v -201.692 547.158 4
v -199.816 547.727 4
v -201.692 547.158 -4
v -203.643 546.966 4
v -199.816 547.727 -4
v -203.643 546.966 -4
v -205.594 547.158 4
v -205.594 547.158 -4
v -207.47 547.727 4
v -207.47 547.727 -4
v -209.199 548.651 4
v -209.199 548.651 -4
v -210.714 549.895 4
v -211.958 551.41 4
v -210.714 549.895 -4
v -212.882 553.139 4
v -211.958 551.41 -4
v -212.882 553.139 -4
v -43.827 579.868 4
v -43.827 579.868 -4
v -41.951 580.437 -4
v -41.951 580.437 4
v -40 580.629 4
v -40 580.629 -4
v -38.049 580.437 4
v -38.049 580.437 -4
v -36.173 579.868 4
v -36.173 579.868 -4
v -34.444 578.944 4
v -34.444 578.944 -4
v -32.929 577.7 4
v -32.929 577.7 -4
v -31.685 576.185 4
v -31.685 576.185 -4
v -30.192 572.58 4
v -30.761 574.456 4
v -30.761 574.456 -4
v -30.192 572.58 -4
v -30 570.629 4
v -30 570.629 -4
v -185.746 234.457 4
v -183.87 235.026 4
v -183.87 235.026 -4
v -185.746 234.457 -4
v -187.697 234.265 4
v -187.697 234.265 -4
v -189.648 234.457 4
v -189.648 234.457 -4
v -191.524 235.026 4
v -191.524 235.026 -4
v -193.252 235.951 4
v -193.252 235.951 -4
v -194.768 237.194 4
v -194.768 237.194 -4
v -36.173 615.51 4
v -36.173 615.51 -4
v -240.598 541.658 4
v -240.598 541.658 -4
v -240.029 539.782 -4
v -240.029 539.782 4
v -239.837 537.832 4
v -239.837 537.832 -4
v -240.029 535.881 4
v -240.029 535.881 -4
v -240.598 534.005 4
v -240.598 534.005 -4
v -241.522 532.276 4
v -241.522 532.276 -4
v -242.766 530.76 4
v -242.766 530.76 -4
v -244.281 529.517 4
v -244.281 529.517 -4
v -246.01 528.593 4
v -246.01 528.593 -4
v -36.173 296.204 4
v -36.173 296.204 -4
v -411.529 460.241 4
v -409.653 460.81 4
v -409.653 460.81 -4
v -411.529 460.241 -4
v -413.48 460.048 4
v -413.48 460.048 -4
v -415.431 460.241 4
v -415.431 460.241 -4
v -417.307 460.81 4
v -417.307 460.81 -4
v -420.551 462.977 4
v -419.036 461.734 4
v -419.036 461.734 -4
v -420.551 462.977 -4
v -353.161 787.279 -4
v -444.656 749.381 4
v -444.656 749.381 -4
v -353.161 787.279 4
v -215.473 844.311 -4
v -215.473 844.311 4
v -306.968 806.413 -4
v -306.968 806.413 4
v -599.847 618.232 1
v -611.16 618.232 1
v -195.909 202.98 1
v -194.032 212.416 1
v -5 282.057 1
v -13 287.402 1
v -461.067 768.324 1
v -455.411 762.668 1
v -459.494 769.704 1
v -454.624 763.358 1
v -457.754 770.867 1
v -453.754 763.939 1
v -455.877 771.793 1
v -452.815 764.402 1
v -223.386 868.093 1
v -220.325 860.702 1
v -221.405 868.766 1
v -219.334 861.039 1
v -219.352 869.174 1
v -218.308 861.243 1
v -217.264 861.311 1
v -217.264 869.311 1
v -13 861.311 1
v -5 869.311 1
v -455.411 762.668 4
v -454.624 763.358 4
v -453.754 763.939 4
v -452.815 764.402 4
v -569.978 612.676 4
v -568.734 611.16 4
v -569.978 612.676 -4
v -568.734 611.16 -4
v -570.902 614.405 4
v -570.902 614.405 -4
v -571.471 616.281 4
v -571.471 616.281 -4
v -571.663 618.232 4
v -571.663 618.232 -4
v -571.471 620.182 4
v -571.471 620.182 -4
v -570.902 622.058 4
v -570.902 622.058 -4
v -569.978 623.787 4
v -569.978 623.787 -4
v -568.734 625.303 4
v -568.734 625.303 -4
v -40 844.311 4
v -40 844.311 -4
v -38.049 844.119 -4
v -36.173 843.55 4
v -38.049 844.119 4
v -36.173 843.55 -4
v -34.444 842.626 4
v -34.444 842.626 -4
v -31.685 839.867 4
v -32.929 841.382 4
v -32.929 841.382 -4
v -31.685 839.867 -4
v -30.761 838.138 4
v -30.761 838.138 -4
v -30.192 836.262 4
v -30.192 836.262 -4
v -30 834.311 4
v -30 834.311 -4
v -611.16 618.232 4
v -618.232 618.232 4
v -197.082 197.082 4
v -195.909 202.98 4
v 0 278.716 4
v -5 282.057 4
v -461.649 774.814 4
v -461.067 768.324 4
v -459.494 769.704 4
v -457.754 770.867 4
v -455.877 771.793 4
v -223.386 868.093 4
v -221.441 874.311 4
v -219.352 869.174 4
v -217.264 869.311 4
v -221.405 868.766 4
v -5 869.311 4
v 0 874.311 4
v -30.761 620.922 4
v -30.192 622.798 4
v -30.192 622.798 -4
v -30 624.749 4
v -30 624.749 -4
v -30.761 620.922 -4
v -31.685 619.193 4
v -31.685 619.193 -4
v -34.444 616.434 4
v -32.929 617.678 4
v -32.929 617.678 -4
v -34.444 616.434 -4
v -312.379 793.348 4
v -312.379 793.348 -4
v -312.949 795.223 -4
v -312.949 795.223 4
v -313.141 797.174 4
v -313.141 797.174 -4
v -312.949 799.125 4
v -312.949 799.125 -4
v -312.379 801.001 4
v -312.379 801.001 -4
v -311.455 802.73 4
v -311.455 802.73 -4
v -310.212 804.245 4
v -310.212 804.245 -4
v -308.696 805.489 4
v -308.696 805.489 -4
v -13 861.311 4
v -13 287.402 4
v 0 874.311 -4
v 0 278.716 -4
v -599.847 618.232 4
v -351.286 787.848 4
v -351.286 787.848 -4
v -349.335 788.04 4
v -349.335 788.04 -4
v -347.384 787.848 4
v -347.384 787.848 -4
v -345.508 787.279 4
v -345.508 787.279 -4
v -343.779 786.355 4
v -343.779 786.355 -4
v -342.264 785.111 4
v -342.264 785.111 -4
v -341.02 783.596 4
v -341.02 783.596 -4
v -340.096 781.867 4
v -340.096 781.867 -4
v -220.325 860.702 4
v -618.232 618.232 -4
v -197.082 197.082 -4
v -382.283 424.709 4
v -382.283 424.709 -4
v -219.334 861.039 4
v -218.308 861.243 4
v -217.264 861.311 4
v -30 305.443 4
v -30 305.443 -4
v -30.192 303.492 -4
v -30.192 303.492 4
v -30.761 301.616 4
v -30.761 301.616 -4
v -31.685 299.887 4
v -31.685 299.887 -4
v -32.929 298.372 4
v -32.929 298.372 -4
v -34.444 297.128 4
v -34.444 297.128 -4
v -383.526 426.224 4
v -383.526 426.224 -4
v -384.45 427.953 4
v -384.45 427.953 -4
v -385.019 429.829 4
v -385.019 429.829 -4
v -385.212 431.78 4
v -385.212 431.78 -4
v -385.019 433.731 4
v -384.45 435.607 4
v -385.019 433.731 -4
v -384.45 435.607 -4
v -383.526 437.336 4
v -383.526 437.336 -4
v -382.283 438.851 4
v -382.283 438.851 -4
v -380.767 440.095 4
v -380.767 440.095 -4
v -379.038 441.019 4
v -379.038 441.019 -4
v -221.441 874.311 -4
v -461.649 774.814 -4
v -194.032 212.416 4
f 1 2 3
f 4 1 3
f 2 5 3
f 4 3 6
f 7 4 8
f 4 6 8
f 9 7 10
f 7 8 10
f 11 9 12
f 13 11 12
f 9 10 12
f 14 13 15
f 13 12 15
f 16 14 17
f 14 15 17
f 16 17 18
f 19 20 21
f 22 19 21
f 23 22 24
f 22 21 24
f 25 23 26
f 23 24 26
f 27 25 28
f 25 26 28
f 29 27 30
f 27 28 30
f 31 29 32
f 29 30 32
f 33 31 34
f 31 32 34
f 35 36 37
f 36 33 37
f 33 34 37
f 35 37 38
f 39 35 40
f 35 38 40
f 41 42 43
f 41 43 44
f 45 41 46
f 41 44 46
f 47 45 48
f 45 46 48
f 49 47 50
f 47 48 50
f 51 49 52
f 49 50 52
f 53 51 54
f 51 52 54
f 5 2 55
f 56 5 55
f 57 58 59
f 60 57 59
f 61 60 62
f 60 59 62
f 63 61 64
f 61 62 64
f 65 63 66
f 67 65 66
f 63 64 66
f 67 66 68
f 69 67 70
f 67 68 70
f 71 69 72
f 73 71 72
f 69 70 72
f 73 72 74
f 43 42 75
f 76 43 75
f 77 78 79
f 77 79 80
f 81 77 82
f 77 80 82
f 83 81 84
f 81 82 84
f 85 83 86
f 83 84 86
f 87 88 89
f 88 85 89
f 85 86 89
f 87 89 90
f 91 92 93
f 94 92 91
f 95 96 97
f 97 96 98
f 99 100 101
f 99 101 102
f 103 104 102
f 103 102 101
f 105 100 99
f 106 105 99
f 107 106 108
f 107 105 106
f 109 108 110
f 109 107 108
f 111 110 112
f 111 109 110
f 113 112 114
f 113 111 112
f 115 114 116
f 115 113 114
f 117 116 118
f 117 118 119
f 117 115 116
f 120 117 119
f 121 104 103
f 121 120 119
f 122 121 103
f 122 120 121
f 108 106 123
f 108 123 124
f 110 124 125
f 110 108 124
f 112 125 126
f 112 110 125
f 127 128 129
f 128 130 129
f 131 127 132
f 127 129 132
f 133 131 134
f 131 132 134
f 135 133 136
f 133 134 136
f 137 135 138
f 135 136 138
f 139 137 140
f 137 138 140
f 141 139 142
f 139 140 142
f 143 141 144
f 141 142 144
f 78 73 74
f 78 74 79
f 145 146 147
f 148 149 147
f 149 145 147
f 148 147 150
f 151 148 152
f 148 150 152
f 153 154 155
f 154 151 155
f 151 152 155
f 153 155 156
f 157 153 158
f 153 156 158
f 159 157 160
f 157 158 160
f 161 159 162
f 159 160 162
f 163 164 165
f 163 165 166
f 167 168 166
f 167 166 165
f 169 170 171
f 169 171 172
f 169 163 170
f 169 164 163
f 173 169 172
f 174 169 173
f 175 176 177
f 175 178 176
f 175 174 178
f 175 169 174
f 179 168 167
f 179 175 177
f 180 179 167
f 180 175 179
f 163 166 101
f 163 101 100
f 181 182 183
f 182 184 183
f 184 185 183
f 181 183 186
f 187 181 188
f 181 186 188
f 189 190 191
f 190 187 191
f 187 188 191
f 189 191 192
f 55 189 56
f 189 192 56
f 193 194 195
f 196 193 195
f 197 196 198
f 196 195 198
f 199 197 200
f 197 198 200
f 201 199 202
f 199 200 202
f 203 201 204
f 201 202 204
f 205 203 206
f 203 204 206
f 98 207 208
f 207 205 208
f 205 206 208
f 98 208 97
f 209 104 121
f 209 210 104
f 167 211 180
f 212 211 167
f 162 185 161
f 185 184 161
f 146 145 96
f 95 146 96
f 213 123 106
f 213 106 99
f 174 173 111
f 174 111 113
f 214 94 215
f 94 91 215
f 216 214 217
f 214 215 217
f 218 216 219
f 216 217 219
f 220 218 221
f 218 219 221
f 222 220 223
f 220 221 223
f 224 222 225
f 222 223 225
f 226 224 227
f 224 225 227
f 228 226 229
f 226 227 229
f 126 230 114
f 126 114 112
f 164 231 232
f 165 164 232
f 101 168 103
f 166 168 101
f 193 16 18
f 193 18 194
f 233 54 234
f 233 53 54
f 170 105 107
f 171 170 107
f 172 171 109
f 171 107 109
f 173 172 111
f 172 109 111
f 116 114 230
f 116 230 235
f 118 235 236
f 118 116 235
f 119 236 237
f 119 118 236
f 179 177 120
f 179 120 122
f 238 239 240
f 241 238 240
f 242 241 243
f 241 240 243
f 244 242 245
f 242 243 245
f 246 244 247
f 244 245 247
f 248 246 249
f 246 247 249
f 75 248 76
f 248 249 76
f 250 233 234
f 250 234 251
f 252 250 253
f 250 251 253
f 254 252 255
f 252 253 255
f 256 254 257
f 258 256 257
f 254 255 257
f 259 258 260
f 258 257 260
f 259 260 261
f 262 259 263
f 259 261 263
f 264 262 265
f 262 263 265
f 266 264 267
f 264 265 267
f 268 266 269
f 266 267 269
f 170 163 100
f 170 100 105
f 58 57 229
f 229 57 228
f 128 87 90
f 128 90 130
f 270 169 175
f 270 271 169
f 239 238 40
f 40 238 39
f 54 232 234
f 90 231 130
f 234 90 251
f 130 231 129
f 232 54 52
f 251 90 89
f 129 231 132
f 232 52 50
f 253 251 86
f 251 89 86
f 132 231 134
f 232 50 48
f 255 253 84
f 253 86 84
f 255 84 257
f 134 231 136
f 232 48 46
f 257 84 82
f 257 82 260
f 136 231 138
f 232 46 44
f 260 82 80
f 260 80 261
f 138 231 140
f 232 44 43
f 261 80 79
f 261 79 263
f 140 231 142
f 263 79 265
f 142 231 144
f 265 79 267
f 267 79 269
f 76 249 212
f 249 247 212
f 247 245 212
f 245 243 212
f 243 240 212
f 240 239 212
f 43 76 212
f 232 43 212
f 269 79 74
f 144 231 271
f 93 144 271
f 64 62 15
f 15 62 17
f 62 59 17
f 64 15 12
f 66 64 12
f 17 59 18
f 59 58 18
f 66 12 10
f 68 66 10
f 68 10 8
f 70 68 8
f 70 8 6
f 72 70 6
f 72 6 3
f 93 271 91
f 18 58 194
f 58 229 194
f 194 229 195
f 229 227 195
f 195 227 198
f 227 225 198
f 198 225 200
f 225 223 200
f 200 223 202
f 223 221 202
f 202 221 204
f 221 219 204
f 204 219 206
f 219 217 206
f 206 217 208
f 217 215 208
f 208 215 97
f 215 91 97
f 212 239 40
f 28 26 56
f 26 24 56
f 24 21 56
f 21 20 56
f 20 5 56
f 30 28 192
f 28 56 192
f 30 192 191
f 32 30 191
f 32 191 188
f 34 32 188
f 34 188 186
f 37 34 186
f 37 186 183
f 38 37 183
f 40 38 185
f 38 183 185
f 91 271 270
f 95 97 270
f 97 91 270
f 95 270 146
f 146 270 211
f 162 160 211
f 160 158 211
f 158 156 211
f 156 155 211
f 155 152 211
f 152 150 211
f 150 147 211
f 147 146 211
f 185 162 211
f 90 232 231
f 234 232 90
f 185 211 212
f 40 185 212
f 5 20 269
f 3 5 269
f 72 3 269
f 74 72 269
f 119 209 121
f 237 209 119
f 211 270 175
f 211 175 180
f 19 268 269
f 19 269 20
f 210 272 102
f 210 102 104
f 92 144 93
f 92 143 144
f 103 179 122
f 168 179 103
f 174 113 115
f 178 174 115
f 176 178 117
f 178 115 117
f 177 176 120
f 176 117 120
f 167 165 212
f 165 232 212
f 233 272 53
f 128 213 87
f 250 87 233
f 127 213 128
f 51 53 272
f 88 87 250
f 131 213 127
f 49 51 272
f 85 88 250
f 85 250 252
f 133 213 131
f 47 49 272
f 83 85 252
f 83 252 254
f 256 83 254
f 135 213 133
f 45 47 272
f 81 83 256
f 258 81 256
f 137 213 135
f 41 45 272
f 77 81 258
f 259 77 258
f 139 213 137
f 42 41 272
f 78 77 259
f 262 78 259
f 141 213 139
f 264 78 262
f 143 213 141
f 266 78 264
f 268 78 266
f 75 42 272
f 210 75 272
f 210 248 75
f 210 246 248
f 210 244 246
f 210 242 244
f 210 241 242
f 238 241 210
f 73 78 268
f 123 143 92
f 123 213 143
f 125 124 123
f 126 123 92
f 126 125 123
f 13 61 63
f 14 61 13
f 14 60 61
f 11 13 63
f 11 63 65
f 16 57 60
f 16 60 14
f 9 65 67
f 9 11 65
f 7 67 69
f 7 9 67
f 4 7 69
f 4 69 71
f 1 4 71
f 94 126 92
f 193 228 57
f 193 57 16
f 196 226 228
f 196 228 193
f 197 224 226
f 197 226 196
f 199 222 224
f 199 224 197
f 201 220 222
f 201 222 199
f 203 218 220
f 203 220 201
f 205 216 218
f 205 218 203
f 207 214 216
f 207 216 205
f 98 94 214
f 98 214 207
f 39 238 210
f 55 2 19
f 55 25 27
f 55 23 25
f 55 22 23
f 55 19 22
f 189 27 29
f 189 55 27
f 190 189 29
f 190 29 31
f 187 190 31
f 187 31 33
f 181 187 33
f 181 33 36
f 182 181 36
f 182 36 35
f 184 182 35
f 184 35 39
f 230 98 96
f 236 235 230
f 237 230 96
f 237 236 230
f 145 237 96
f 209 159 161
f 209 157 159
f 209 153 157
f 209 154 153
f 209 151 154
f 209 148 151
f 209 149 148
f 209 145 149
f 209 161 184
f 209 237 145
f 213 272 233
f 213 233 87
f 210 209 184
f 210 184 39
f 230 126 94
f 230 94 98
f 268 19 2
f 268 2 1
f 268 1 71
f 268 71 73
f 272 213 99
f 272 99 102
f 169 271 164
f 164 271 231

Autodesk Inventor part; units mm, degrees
ref_plane "YZ Plane" through (0, 0, 0) normal (1, 0, 0) x (0, 1, 0)
ref_plane "XZ Plane" through (0, 0, 0) normal (0, 1, 0) x (-1, 0, 0)
ref_plane "XY Plane" through (0, 0, 0) normal (0, 0, 1) x (1, 0, 0)
sketch "Sketch1" plane through (0, 0, 0) normal (0, 0, 1) x (1, 0, 0)
  line L0 (0, 278.716) -> (197.082, 197.082) construction
  line L1 (197.082, 197.082) -> (278.716, 0) construction
  line L2 (278.716, 0) -> (197.082, -197.082) construction
  line L3 (197.082, -197.082) -> (0, -278.716) construction
  line L4 (0, -278.716) -> (-197.082, -197.082) construction
  line L5 (-197.082, -197.082) -> (-278.716, 0) construction
  line L6 (-278.716, 0) -> (-197.082, 197.082) construction
  line L7 (-197.082, 197.082) -> (0, 278.716)
  line L8 (-197.082, 197.082) -> (0, 278.716)
  line L9 (-461.6493, 774.8136) -> (-221.4406, 874.3113)
  line L10 (-98.541, 237.899) -> (-341.545, 824.5625) construction
  line L11 (-221.4406, 874.3113) -> (0, 874.3113)
  line L12 (0, 874.3113) -> (0, 278.716)
  line L13 (-461.6493, 774.8136) -> (-618.2315, 618.2315)
  line L14 (-618.2315, 618.2315) -> (-197.082, 197.082)
  point P0 (0, 0)
  point P1 (0, 0)
  dimension "d0" = 515
  dimension "d2" = 260
  dimension "d3" = 635
extrude "Extrusion1" add sketch "Sketch1" along normal mid plane 8
sketch "Sketch2" plane through (0, 0, 4) normal (0, 0, 1) x (1, 0, 0)
  line L0 (-221.4406, 874.3113) -> (-461.6493, 774.8136) projected
  line L1 (-461.6493, 774.8136) -> (-618.2315, 618.2315) projected
  line L2 (-236.7713, 532.4196) -> (-415.8262, 458.2526)
  line L3 (-197.082, 197.082) -> (0, 278.716) projected
  line L4 (-98.541, 237.899) -> (-341.545, 824.5625) construction
  line L5 (-618.2315, 618.2315) -> (-197.082, 197.082) projected
  line L6 (-415.8262, 458.2526) -> (-575.8051, 618.2315)
  line L7 (-575.8051, 618.2315) -> (-444.6557, 749.3809)
  line L8 (-444.6557, 749.3809) -> (-343.9227, 791.1058)
  line L9 (-236.7713, 532.4196) -> (-343.9227, 791.1058)
  line L10 (-209.0549, 543.9001) -> (-30, 618.067)
  line L11 (-30, 618.067) -> (-30, 844.3113)
  line L12 (-30, 844.3113) -> (-215.4733, 844.3113)
  line L13 (-215.4733, 844.3113) -> (-316.2063, 802.5863)
  line L14 (-209.0549, 543.9001) -> (-316.2063, 802.5863)
  line L15 (0, 278.716) -> (0, 874.3113) projected
  line L16 (-415.8262, 458.2526) -> (-30, 618.067) construction
  line L17 (-392.8652, 435.2916) -> (-30, 585.5953)
  line L18 (-190.043, 232.4694) -> (-30, 298.7614)
  line L19 (-30, 298.7614) -> (-30, 585.5953)
  line L20 (-190.043, 232.4694) -> (-392.8652, 435.2916)
  point P0 (0, 0)
  dimension "d11" = 30
  dimension "d12" = 280
  dimension "d13" = 30
  dimension "d14" = 30
  dimension "d15" = 15
  dimension "d21" = 30
  dimension "d22" = 30
  dimension "d23" = 30
  dimension "d24" = 30
extrude "Extrusion2" cut sketch "Sketch2" against normal up to surface (8 mm away)
fillet "Fillet1" radius 10 12 edges at (-575.8051, 618.2315, 0) (-343.9227, 791.1058, 0) (-236.7713, 532.4196, 0) (-415.8262, 458.2526, 0) (-316.2063, 802.5863, 0) (-30, 844.3113, 0) (-30, 618.067, 0) (-209.0549, 543.9001, 0) (-392.8652, 435.2916, 0) (-30, 585.5953, 0) (-30, 298.7614, 0) (-190.043, 232.4694, 0)
sketch "Sketch4" plane through (0, 0, 4) normal (0, 0, 1) x (1, 0, 0)
  line L0 (-221.4406, 874.3113) -> (-461.6493, 774.8136) projected
  line L1 (0, 874.3113) -> (-221.4406, 874.3113) projected
  line L2 (-461.6493, 774.8136) -> (-618.2315, 618.2315) projected
  line L3 (-618.2315, 618.2315) -> (-197.082, 197.082) projected
  line L4 (-197.082, 197.082) -> (0, 278.716) projected
  line L5 (0, 278.716) -> (0, 874.3113) projected
  line L6 (-458.817, 770.5748) -> (-220.4461, 869.3113)
  line L7 (-220.4461, 869.3113) -> (-5, 869.3113)
  line L8 (-5, 869.3113) -> (-5, 282.0569)
  line L9 (-5, 282.0569) -> (-195.9088, 202.9799)
  line L10 (-195.9088, 202.9799) -> (-611.1604, 618.2315)
  line L11 (-611.1604, 618.2315) -> (-458.817, 770.5748)
  line L12 (-218.8548, 861.3113) -> (-454.2854, 763.7928)
  line L13 (-454.2854, 763.7928) -> (-599.8467, 618.2315)
  line L14 (-599.8467, 618.2315) -> (-194.0317, 212.4165)
  line L15 (-194.0317, 212.4165) -> (-13, 287.4023)
  line L16 (-13, 287.4023) -> (-13, 861.3113)
  line L17 (-13, 861.3113) -> (-218.8548, 861.3113)
  point P0 (0, 0)
  dimension "d26" = 5
  dimension "d27" = 8
extrude "Extrusion3" cut sketch "Sketch4" against normal blind 3 contours L6 L7 L8 L9 L10 L11
fillet "Fillet3" radius 16 2 edges at (-220.4461, 869.3113, 2.5) (-458.817, 770.5748, 2.5)
fillet "Fillet4" radius 8 2 edges at (-454.2854, 763.7928, 2.5) (-218.8548, 861.3113, 2.5)
equation "\"d0\" = Барабан_размер_по_плоскостям"
equation "\"d2\" = Кассета_длина_грани"
equation "\"d3\" = Кассета_высота"
equation "\"d11\" = d13"
equation "\"d14\" = d13"
equation "\"d15\" = 0.5 * d13"
equation "\"d21\" = d13"
equation "\"d22\" = d13"
equation "\"d23\" = d13"
equation "\"d24\" = d13"
equation "\"Барабан_размер_по_плоскостям\" = 515"
equation "\"Кассета_длина_грани\" = 260"
equation "\"Кассета_высота\" = 635"
properties part number "DMF 01 51 outside frame v2.1"
